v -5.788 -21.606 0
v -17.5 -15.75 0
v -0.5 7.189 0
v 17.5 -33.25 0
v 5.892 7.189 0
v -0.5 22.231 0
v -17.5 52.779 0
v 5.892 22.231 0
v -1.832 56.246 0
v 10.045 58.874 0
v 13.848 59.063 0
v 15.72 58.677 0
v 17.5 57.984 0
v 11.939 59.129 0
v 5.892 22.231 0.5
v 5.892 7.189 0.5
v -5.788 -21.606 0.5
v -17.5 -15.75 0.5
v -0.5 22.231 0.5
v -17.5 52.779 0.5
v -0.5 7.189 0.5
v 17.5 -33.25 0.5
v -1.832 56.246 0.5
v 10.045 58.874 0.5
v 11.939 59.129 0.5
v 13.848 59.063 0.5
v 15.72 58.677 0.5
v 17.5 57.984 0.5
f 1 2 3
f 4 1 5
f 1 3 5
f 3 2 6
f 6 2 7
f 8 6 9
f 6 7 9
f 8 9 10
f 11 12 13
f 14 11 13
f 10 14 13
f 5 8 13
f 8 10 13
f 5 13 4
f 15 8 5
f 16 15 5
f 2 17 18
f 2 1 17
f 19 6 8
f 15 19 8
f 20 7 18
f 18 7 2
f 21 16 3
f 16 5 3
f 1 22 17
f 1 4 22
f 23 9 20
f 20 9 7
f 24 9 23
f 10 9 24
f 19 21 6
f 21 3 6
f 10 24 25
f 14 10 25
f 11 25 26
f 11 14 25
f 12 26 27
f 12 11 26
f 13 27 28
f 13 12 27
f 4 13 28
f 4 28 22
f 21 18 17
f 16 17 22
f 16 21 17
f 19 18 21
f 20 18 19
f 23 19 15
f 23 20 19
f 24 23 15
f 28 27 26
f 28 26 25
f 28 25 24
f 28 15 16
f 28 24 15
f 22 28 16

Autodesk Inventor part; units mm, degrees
ref_plane "YZ Plane" through (0, 0, 0) normal (1, 0, 0) x (0, 1, 0)
ref_plane "XZ Plane" through (0, 0, 0) normal (0, 1, 0) x (-1, 0, 0)
ref_plane "XY Plane" through (0, 0, 0) normal (0, 0, 1) x (1, 0, 0)
sketch "Sketch1" plane through (0, 0, 0) normal (0, 0, 1) x (1, 0, 0)
  line L0 (7.5, 3.8038) -> (3.6225, 3.8038) projected
  arc A0 (1.9153, 4.762) -> (3.6225, 3.8038) centre (3.6225, 5.8038) ccw projected
  line L1 (1.9153, 4.762) -> (-2.2072, 11.517) projected
  arc A1 (-2.5, 12.5588) -> (-2.2072, 11.517) centre (-0.5, 12.5588) ccw projected
  line L2 (-2.5, 12.5588) -> (-2.5, 21.8038) projected
  arc A2 (-0.5, 23.8038) -> (-2.5, 21.8038) centre (-0.5, 21.8038) ccw projected
  line L3 (-0.5, 23.8038) -> (7.5, 23.8038) projected
  line L4 (7.5, 23.8038) -> (7.5, 3.8038) projected
  spline S0 degree 3 poles (-6.0485, -11.2843) (-6.0213, -11.0209) (-5.9428, -10.7653) (-5.6929, -10.2997) (-5.524, -10.094) (-5.1467, -9.7842) (-4.9505, -9.6718) (-4.5292, -9.5173) (-4.3073, -9.4763) (-4.0832, -9.4731) knots 0 0 0 0 0.079442 0.079442 0.158531 0.158531 0.225919 0.225919 0.293184 0.293184 0.293184 0.293184 projected
  line L5 (-6.0485, -11.2843) -> (-6.563, -16.2598) projected
  line L6 (-6.563, -16.2598) -> (-6.8849, -19.6266) projected
  arc A3 (-6.8849, -19.6266) -> (-5.7884, -21.6058) centre (-4.894, -19.817) ccw projected
  line L7 (17.5, -33.2499) -> (-5.7884, -21.6058) projected
  line L8 (17.5, 31.9794) -> (17.5, -33.2499) projected
  arc A4 (4.376, 33.2499) -> (17.5, 31.9794) centre (12.5, 48.7499) ccw projected
  arc A5 (-1.8324, 56.2463) -> (4.376, 33.2499) centre (12.5, 47.7794) ccw projected
  line L9 (-1.8324, 56.2463) -> (-17.5, 52.7794) projected
  line L10 (-17.5, 52.7794) -> (-17.5, 3.0185) projected
  ellipse E0 centre (-15.5, 3.0185) end of major axis (-15.5, 1.0011) minor radius 2 (-17.5, 3.0185) -> (-15.6888, 1.0101) ccw projected
  line L11 (-15.6888, 1.0101) -> (-3.1949, -0.1848) projected
  line L12 (-3.1949, -0.1848) -> (-4.0832, -9.4731) projected
  circle A6 centre (-12, 26.728) radius 1.25 projected
  circle A7 centre (5.3255, 26.728) radius 1.25 projected
  line L13 (-14, 9.2999) -> (-10, 9.2999) projected
  line L14 (-14, 15.6999) -> (-14, 9.2999) projected
  line L15 (-10, 15.6999) -> (-14, 15.6999) projected
  line L16 (-10, 9.2999) -> (-10, 15.6999) projected
  line L17 (13.7851, 6.0601) -> (9.7851, 6.0601) projected
  line L18 (13.7851, -0.3399) -> (13.7851, 6.0601) projected
  line L19 (9.7851, -0.3399) -> (13.7851, -0.3399) projected
  line L20 (9.7851, 6.0601) -> (9.7851, -0.3399) projected
  circle A8 centre (7.1425, -8.6154) radius 1.25 projected
  line L21 (17.5, -33.2499) -> (-17.5, -15.7501) projected
  line L22 (-17.5, -15.7501) -> (-17.5, -17.9862) projected
  line L23 (-17.5, -17.9862) -> (17.5, -35.486) projected
  line L24 (17.5, -35.486) -> (17.5, -33.2499) projected
  line L25 (-1.4649, 56.8397) -> (-18, 53.1809) projected
  line L26 (-18, 53.1809) -> (-18, -17.9862) projected
  line L27 (-18, -17.9862) -> (-17.5, -17.9862) projected
  line L28 (-17.5, -17.9862) -> (-17.5, 52.7794) projected
  line L29 (-17.5, 52.7794) -> (-1.8324, 56.2463) projected
  arc A9 (-1.4649, 56.8397) -> (-1.8324, 56.2463) centre (12.5, 47.7794) ccw projected
  line L30 (19.5, -37.0206) -> (19.5, 31.9794) projected
  line L31 (19.5, 31.9794) -> (17.5, 31.9794) projected
  line L32 (17.5, -37.0206) -> (17.5, 31.9794) projected
  line L33 (19.5, -37.0206) -> (17.5, -37.0206) projected
  circle A10 centre (12.5, 47.7794) radius 15.02 projected
  line L34 (-1.4649, 56.8397) -> (-11.9805, 54.5129)
  line L35 (-11.9805, 54.5129) -> (26.5324, 63.5095)
  line L36 (17.5, 31.9794) -> (17.5, 20.7849)
  line L37 (17.5, 20.7849) -> (17.5, 78.444)
  circle A11 centre (12.5, 47.7794) radius 12.1257
  line L38 (-17.5, -15.7501) -> (-17.5, 52.7794)
  line L39 (-1.8324, 56.2463) -> (11.2654, 59.1445)
  line L40 (11.2654, 59.1445) -> (26.5324, 62.5227)
  circle A12 centre (12.5, 47.7794) radius 11.3634
  line L41 (5.8925, 7.1892) -> (-0.5, 7.1892)
  line L42 (-0.5, 7.1892) -> (-0.5, 22.231)
  line L43 (-0.5, 22.231) -> (5.8925, 22.231)
  line L44 (5.8925, 22.231) -> (5.8925, 7.1892)
  point P0 (0, 0)
  point P1 (17.5, 57.9837)
  point P2 (10.0449, 58.8745)
extrude "Extrusion1" add sketch "Sketch1" along normal blind 0.5 contours L0 A0 L1 L41 L44 L43 L42 A1 L2 A2 L3 L4 | L5 L6 A3 L21 L28 E0 L11 L12 S0 | S0 L12 L11 E0 L10 L9 A5 A4 L8 L7 A3 L6 L5 | L39 A10 L37 A4 A5 | L39 A11 L37 A10 | L39 A12 L37 A11 | A12 L37 | L14 L15 L16 L13 | L18 L19 L20 L17 picked at (9.8401, 51.5561)
sketch "Sketch2" plane through (0, 0, 0.5) normal (0, 0, 1) x (1, 0, 0)
  line L0 (17.5, -33.2499) -> (17.5, 57.9837) projected
  arc A0 (17.5, 57.9837) -> (10.0449, 58.8745) centre (12.5, 47.7794) ccw projected
  line L1 (10.0449, 58.8745) -> (-17.5, 52.7794) projected
  line L2 (-17.5, 52.7794) -> (-17.5, -15.7501) projected
  line L3 (-17.5, -15.7501) -> (17.5, -33.2499) projected
  circle A1 centre (-12, 26.728) radius 1.25 projected
  circle A2 centre (5.3255, 26.728) radius 1.25 projected
  circle A3 centre (7.1425, -8.6154) radius 1.25 projected
  line L4 (-0.5, 7.1892) -> (-0.5, 22.231) projected
  line L5 (-0.5, 22.231) -> (5.8925, 22.231) projected
  line L6 (5.8925, 22.231) -> (5.8925, 7.1892) projected
  line L7 (5.8925, 7.1892) -> (-0.5, 7.1892) projected
  point P0 (0, 0)
extrude "Extrusion2" add sketch "Sketch2" against normal blind 0.5 contours A1 | A2 | A3
properties part number "pokrywa lewa" material "Aluminum 6061"
